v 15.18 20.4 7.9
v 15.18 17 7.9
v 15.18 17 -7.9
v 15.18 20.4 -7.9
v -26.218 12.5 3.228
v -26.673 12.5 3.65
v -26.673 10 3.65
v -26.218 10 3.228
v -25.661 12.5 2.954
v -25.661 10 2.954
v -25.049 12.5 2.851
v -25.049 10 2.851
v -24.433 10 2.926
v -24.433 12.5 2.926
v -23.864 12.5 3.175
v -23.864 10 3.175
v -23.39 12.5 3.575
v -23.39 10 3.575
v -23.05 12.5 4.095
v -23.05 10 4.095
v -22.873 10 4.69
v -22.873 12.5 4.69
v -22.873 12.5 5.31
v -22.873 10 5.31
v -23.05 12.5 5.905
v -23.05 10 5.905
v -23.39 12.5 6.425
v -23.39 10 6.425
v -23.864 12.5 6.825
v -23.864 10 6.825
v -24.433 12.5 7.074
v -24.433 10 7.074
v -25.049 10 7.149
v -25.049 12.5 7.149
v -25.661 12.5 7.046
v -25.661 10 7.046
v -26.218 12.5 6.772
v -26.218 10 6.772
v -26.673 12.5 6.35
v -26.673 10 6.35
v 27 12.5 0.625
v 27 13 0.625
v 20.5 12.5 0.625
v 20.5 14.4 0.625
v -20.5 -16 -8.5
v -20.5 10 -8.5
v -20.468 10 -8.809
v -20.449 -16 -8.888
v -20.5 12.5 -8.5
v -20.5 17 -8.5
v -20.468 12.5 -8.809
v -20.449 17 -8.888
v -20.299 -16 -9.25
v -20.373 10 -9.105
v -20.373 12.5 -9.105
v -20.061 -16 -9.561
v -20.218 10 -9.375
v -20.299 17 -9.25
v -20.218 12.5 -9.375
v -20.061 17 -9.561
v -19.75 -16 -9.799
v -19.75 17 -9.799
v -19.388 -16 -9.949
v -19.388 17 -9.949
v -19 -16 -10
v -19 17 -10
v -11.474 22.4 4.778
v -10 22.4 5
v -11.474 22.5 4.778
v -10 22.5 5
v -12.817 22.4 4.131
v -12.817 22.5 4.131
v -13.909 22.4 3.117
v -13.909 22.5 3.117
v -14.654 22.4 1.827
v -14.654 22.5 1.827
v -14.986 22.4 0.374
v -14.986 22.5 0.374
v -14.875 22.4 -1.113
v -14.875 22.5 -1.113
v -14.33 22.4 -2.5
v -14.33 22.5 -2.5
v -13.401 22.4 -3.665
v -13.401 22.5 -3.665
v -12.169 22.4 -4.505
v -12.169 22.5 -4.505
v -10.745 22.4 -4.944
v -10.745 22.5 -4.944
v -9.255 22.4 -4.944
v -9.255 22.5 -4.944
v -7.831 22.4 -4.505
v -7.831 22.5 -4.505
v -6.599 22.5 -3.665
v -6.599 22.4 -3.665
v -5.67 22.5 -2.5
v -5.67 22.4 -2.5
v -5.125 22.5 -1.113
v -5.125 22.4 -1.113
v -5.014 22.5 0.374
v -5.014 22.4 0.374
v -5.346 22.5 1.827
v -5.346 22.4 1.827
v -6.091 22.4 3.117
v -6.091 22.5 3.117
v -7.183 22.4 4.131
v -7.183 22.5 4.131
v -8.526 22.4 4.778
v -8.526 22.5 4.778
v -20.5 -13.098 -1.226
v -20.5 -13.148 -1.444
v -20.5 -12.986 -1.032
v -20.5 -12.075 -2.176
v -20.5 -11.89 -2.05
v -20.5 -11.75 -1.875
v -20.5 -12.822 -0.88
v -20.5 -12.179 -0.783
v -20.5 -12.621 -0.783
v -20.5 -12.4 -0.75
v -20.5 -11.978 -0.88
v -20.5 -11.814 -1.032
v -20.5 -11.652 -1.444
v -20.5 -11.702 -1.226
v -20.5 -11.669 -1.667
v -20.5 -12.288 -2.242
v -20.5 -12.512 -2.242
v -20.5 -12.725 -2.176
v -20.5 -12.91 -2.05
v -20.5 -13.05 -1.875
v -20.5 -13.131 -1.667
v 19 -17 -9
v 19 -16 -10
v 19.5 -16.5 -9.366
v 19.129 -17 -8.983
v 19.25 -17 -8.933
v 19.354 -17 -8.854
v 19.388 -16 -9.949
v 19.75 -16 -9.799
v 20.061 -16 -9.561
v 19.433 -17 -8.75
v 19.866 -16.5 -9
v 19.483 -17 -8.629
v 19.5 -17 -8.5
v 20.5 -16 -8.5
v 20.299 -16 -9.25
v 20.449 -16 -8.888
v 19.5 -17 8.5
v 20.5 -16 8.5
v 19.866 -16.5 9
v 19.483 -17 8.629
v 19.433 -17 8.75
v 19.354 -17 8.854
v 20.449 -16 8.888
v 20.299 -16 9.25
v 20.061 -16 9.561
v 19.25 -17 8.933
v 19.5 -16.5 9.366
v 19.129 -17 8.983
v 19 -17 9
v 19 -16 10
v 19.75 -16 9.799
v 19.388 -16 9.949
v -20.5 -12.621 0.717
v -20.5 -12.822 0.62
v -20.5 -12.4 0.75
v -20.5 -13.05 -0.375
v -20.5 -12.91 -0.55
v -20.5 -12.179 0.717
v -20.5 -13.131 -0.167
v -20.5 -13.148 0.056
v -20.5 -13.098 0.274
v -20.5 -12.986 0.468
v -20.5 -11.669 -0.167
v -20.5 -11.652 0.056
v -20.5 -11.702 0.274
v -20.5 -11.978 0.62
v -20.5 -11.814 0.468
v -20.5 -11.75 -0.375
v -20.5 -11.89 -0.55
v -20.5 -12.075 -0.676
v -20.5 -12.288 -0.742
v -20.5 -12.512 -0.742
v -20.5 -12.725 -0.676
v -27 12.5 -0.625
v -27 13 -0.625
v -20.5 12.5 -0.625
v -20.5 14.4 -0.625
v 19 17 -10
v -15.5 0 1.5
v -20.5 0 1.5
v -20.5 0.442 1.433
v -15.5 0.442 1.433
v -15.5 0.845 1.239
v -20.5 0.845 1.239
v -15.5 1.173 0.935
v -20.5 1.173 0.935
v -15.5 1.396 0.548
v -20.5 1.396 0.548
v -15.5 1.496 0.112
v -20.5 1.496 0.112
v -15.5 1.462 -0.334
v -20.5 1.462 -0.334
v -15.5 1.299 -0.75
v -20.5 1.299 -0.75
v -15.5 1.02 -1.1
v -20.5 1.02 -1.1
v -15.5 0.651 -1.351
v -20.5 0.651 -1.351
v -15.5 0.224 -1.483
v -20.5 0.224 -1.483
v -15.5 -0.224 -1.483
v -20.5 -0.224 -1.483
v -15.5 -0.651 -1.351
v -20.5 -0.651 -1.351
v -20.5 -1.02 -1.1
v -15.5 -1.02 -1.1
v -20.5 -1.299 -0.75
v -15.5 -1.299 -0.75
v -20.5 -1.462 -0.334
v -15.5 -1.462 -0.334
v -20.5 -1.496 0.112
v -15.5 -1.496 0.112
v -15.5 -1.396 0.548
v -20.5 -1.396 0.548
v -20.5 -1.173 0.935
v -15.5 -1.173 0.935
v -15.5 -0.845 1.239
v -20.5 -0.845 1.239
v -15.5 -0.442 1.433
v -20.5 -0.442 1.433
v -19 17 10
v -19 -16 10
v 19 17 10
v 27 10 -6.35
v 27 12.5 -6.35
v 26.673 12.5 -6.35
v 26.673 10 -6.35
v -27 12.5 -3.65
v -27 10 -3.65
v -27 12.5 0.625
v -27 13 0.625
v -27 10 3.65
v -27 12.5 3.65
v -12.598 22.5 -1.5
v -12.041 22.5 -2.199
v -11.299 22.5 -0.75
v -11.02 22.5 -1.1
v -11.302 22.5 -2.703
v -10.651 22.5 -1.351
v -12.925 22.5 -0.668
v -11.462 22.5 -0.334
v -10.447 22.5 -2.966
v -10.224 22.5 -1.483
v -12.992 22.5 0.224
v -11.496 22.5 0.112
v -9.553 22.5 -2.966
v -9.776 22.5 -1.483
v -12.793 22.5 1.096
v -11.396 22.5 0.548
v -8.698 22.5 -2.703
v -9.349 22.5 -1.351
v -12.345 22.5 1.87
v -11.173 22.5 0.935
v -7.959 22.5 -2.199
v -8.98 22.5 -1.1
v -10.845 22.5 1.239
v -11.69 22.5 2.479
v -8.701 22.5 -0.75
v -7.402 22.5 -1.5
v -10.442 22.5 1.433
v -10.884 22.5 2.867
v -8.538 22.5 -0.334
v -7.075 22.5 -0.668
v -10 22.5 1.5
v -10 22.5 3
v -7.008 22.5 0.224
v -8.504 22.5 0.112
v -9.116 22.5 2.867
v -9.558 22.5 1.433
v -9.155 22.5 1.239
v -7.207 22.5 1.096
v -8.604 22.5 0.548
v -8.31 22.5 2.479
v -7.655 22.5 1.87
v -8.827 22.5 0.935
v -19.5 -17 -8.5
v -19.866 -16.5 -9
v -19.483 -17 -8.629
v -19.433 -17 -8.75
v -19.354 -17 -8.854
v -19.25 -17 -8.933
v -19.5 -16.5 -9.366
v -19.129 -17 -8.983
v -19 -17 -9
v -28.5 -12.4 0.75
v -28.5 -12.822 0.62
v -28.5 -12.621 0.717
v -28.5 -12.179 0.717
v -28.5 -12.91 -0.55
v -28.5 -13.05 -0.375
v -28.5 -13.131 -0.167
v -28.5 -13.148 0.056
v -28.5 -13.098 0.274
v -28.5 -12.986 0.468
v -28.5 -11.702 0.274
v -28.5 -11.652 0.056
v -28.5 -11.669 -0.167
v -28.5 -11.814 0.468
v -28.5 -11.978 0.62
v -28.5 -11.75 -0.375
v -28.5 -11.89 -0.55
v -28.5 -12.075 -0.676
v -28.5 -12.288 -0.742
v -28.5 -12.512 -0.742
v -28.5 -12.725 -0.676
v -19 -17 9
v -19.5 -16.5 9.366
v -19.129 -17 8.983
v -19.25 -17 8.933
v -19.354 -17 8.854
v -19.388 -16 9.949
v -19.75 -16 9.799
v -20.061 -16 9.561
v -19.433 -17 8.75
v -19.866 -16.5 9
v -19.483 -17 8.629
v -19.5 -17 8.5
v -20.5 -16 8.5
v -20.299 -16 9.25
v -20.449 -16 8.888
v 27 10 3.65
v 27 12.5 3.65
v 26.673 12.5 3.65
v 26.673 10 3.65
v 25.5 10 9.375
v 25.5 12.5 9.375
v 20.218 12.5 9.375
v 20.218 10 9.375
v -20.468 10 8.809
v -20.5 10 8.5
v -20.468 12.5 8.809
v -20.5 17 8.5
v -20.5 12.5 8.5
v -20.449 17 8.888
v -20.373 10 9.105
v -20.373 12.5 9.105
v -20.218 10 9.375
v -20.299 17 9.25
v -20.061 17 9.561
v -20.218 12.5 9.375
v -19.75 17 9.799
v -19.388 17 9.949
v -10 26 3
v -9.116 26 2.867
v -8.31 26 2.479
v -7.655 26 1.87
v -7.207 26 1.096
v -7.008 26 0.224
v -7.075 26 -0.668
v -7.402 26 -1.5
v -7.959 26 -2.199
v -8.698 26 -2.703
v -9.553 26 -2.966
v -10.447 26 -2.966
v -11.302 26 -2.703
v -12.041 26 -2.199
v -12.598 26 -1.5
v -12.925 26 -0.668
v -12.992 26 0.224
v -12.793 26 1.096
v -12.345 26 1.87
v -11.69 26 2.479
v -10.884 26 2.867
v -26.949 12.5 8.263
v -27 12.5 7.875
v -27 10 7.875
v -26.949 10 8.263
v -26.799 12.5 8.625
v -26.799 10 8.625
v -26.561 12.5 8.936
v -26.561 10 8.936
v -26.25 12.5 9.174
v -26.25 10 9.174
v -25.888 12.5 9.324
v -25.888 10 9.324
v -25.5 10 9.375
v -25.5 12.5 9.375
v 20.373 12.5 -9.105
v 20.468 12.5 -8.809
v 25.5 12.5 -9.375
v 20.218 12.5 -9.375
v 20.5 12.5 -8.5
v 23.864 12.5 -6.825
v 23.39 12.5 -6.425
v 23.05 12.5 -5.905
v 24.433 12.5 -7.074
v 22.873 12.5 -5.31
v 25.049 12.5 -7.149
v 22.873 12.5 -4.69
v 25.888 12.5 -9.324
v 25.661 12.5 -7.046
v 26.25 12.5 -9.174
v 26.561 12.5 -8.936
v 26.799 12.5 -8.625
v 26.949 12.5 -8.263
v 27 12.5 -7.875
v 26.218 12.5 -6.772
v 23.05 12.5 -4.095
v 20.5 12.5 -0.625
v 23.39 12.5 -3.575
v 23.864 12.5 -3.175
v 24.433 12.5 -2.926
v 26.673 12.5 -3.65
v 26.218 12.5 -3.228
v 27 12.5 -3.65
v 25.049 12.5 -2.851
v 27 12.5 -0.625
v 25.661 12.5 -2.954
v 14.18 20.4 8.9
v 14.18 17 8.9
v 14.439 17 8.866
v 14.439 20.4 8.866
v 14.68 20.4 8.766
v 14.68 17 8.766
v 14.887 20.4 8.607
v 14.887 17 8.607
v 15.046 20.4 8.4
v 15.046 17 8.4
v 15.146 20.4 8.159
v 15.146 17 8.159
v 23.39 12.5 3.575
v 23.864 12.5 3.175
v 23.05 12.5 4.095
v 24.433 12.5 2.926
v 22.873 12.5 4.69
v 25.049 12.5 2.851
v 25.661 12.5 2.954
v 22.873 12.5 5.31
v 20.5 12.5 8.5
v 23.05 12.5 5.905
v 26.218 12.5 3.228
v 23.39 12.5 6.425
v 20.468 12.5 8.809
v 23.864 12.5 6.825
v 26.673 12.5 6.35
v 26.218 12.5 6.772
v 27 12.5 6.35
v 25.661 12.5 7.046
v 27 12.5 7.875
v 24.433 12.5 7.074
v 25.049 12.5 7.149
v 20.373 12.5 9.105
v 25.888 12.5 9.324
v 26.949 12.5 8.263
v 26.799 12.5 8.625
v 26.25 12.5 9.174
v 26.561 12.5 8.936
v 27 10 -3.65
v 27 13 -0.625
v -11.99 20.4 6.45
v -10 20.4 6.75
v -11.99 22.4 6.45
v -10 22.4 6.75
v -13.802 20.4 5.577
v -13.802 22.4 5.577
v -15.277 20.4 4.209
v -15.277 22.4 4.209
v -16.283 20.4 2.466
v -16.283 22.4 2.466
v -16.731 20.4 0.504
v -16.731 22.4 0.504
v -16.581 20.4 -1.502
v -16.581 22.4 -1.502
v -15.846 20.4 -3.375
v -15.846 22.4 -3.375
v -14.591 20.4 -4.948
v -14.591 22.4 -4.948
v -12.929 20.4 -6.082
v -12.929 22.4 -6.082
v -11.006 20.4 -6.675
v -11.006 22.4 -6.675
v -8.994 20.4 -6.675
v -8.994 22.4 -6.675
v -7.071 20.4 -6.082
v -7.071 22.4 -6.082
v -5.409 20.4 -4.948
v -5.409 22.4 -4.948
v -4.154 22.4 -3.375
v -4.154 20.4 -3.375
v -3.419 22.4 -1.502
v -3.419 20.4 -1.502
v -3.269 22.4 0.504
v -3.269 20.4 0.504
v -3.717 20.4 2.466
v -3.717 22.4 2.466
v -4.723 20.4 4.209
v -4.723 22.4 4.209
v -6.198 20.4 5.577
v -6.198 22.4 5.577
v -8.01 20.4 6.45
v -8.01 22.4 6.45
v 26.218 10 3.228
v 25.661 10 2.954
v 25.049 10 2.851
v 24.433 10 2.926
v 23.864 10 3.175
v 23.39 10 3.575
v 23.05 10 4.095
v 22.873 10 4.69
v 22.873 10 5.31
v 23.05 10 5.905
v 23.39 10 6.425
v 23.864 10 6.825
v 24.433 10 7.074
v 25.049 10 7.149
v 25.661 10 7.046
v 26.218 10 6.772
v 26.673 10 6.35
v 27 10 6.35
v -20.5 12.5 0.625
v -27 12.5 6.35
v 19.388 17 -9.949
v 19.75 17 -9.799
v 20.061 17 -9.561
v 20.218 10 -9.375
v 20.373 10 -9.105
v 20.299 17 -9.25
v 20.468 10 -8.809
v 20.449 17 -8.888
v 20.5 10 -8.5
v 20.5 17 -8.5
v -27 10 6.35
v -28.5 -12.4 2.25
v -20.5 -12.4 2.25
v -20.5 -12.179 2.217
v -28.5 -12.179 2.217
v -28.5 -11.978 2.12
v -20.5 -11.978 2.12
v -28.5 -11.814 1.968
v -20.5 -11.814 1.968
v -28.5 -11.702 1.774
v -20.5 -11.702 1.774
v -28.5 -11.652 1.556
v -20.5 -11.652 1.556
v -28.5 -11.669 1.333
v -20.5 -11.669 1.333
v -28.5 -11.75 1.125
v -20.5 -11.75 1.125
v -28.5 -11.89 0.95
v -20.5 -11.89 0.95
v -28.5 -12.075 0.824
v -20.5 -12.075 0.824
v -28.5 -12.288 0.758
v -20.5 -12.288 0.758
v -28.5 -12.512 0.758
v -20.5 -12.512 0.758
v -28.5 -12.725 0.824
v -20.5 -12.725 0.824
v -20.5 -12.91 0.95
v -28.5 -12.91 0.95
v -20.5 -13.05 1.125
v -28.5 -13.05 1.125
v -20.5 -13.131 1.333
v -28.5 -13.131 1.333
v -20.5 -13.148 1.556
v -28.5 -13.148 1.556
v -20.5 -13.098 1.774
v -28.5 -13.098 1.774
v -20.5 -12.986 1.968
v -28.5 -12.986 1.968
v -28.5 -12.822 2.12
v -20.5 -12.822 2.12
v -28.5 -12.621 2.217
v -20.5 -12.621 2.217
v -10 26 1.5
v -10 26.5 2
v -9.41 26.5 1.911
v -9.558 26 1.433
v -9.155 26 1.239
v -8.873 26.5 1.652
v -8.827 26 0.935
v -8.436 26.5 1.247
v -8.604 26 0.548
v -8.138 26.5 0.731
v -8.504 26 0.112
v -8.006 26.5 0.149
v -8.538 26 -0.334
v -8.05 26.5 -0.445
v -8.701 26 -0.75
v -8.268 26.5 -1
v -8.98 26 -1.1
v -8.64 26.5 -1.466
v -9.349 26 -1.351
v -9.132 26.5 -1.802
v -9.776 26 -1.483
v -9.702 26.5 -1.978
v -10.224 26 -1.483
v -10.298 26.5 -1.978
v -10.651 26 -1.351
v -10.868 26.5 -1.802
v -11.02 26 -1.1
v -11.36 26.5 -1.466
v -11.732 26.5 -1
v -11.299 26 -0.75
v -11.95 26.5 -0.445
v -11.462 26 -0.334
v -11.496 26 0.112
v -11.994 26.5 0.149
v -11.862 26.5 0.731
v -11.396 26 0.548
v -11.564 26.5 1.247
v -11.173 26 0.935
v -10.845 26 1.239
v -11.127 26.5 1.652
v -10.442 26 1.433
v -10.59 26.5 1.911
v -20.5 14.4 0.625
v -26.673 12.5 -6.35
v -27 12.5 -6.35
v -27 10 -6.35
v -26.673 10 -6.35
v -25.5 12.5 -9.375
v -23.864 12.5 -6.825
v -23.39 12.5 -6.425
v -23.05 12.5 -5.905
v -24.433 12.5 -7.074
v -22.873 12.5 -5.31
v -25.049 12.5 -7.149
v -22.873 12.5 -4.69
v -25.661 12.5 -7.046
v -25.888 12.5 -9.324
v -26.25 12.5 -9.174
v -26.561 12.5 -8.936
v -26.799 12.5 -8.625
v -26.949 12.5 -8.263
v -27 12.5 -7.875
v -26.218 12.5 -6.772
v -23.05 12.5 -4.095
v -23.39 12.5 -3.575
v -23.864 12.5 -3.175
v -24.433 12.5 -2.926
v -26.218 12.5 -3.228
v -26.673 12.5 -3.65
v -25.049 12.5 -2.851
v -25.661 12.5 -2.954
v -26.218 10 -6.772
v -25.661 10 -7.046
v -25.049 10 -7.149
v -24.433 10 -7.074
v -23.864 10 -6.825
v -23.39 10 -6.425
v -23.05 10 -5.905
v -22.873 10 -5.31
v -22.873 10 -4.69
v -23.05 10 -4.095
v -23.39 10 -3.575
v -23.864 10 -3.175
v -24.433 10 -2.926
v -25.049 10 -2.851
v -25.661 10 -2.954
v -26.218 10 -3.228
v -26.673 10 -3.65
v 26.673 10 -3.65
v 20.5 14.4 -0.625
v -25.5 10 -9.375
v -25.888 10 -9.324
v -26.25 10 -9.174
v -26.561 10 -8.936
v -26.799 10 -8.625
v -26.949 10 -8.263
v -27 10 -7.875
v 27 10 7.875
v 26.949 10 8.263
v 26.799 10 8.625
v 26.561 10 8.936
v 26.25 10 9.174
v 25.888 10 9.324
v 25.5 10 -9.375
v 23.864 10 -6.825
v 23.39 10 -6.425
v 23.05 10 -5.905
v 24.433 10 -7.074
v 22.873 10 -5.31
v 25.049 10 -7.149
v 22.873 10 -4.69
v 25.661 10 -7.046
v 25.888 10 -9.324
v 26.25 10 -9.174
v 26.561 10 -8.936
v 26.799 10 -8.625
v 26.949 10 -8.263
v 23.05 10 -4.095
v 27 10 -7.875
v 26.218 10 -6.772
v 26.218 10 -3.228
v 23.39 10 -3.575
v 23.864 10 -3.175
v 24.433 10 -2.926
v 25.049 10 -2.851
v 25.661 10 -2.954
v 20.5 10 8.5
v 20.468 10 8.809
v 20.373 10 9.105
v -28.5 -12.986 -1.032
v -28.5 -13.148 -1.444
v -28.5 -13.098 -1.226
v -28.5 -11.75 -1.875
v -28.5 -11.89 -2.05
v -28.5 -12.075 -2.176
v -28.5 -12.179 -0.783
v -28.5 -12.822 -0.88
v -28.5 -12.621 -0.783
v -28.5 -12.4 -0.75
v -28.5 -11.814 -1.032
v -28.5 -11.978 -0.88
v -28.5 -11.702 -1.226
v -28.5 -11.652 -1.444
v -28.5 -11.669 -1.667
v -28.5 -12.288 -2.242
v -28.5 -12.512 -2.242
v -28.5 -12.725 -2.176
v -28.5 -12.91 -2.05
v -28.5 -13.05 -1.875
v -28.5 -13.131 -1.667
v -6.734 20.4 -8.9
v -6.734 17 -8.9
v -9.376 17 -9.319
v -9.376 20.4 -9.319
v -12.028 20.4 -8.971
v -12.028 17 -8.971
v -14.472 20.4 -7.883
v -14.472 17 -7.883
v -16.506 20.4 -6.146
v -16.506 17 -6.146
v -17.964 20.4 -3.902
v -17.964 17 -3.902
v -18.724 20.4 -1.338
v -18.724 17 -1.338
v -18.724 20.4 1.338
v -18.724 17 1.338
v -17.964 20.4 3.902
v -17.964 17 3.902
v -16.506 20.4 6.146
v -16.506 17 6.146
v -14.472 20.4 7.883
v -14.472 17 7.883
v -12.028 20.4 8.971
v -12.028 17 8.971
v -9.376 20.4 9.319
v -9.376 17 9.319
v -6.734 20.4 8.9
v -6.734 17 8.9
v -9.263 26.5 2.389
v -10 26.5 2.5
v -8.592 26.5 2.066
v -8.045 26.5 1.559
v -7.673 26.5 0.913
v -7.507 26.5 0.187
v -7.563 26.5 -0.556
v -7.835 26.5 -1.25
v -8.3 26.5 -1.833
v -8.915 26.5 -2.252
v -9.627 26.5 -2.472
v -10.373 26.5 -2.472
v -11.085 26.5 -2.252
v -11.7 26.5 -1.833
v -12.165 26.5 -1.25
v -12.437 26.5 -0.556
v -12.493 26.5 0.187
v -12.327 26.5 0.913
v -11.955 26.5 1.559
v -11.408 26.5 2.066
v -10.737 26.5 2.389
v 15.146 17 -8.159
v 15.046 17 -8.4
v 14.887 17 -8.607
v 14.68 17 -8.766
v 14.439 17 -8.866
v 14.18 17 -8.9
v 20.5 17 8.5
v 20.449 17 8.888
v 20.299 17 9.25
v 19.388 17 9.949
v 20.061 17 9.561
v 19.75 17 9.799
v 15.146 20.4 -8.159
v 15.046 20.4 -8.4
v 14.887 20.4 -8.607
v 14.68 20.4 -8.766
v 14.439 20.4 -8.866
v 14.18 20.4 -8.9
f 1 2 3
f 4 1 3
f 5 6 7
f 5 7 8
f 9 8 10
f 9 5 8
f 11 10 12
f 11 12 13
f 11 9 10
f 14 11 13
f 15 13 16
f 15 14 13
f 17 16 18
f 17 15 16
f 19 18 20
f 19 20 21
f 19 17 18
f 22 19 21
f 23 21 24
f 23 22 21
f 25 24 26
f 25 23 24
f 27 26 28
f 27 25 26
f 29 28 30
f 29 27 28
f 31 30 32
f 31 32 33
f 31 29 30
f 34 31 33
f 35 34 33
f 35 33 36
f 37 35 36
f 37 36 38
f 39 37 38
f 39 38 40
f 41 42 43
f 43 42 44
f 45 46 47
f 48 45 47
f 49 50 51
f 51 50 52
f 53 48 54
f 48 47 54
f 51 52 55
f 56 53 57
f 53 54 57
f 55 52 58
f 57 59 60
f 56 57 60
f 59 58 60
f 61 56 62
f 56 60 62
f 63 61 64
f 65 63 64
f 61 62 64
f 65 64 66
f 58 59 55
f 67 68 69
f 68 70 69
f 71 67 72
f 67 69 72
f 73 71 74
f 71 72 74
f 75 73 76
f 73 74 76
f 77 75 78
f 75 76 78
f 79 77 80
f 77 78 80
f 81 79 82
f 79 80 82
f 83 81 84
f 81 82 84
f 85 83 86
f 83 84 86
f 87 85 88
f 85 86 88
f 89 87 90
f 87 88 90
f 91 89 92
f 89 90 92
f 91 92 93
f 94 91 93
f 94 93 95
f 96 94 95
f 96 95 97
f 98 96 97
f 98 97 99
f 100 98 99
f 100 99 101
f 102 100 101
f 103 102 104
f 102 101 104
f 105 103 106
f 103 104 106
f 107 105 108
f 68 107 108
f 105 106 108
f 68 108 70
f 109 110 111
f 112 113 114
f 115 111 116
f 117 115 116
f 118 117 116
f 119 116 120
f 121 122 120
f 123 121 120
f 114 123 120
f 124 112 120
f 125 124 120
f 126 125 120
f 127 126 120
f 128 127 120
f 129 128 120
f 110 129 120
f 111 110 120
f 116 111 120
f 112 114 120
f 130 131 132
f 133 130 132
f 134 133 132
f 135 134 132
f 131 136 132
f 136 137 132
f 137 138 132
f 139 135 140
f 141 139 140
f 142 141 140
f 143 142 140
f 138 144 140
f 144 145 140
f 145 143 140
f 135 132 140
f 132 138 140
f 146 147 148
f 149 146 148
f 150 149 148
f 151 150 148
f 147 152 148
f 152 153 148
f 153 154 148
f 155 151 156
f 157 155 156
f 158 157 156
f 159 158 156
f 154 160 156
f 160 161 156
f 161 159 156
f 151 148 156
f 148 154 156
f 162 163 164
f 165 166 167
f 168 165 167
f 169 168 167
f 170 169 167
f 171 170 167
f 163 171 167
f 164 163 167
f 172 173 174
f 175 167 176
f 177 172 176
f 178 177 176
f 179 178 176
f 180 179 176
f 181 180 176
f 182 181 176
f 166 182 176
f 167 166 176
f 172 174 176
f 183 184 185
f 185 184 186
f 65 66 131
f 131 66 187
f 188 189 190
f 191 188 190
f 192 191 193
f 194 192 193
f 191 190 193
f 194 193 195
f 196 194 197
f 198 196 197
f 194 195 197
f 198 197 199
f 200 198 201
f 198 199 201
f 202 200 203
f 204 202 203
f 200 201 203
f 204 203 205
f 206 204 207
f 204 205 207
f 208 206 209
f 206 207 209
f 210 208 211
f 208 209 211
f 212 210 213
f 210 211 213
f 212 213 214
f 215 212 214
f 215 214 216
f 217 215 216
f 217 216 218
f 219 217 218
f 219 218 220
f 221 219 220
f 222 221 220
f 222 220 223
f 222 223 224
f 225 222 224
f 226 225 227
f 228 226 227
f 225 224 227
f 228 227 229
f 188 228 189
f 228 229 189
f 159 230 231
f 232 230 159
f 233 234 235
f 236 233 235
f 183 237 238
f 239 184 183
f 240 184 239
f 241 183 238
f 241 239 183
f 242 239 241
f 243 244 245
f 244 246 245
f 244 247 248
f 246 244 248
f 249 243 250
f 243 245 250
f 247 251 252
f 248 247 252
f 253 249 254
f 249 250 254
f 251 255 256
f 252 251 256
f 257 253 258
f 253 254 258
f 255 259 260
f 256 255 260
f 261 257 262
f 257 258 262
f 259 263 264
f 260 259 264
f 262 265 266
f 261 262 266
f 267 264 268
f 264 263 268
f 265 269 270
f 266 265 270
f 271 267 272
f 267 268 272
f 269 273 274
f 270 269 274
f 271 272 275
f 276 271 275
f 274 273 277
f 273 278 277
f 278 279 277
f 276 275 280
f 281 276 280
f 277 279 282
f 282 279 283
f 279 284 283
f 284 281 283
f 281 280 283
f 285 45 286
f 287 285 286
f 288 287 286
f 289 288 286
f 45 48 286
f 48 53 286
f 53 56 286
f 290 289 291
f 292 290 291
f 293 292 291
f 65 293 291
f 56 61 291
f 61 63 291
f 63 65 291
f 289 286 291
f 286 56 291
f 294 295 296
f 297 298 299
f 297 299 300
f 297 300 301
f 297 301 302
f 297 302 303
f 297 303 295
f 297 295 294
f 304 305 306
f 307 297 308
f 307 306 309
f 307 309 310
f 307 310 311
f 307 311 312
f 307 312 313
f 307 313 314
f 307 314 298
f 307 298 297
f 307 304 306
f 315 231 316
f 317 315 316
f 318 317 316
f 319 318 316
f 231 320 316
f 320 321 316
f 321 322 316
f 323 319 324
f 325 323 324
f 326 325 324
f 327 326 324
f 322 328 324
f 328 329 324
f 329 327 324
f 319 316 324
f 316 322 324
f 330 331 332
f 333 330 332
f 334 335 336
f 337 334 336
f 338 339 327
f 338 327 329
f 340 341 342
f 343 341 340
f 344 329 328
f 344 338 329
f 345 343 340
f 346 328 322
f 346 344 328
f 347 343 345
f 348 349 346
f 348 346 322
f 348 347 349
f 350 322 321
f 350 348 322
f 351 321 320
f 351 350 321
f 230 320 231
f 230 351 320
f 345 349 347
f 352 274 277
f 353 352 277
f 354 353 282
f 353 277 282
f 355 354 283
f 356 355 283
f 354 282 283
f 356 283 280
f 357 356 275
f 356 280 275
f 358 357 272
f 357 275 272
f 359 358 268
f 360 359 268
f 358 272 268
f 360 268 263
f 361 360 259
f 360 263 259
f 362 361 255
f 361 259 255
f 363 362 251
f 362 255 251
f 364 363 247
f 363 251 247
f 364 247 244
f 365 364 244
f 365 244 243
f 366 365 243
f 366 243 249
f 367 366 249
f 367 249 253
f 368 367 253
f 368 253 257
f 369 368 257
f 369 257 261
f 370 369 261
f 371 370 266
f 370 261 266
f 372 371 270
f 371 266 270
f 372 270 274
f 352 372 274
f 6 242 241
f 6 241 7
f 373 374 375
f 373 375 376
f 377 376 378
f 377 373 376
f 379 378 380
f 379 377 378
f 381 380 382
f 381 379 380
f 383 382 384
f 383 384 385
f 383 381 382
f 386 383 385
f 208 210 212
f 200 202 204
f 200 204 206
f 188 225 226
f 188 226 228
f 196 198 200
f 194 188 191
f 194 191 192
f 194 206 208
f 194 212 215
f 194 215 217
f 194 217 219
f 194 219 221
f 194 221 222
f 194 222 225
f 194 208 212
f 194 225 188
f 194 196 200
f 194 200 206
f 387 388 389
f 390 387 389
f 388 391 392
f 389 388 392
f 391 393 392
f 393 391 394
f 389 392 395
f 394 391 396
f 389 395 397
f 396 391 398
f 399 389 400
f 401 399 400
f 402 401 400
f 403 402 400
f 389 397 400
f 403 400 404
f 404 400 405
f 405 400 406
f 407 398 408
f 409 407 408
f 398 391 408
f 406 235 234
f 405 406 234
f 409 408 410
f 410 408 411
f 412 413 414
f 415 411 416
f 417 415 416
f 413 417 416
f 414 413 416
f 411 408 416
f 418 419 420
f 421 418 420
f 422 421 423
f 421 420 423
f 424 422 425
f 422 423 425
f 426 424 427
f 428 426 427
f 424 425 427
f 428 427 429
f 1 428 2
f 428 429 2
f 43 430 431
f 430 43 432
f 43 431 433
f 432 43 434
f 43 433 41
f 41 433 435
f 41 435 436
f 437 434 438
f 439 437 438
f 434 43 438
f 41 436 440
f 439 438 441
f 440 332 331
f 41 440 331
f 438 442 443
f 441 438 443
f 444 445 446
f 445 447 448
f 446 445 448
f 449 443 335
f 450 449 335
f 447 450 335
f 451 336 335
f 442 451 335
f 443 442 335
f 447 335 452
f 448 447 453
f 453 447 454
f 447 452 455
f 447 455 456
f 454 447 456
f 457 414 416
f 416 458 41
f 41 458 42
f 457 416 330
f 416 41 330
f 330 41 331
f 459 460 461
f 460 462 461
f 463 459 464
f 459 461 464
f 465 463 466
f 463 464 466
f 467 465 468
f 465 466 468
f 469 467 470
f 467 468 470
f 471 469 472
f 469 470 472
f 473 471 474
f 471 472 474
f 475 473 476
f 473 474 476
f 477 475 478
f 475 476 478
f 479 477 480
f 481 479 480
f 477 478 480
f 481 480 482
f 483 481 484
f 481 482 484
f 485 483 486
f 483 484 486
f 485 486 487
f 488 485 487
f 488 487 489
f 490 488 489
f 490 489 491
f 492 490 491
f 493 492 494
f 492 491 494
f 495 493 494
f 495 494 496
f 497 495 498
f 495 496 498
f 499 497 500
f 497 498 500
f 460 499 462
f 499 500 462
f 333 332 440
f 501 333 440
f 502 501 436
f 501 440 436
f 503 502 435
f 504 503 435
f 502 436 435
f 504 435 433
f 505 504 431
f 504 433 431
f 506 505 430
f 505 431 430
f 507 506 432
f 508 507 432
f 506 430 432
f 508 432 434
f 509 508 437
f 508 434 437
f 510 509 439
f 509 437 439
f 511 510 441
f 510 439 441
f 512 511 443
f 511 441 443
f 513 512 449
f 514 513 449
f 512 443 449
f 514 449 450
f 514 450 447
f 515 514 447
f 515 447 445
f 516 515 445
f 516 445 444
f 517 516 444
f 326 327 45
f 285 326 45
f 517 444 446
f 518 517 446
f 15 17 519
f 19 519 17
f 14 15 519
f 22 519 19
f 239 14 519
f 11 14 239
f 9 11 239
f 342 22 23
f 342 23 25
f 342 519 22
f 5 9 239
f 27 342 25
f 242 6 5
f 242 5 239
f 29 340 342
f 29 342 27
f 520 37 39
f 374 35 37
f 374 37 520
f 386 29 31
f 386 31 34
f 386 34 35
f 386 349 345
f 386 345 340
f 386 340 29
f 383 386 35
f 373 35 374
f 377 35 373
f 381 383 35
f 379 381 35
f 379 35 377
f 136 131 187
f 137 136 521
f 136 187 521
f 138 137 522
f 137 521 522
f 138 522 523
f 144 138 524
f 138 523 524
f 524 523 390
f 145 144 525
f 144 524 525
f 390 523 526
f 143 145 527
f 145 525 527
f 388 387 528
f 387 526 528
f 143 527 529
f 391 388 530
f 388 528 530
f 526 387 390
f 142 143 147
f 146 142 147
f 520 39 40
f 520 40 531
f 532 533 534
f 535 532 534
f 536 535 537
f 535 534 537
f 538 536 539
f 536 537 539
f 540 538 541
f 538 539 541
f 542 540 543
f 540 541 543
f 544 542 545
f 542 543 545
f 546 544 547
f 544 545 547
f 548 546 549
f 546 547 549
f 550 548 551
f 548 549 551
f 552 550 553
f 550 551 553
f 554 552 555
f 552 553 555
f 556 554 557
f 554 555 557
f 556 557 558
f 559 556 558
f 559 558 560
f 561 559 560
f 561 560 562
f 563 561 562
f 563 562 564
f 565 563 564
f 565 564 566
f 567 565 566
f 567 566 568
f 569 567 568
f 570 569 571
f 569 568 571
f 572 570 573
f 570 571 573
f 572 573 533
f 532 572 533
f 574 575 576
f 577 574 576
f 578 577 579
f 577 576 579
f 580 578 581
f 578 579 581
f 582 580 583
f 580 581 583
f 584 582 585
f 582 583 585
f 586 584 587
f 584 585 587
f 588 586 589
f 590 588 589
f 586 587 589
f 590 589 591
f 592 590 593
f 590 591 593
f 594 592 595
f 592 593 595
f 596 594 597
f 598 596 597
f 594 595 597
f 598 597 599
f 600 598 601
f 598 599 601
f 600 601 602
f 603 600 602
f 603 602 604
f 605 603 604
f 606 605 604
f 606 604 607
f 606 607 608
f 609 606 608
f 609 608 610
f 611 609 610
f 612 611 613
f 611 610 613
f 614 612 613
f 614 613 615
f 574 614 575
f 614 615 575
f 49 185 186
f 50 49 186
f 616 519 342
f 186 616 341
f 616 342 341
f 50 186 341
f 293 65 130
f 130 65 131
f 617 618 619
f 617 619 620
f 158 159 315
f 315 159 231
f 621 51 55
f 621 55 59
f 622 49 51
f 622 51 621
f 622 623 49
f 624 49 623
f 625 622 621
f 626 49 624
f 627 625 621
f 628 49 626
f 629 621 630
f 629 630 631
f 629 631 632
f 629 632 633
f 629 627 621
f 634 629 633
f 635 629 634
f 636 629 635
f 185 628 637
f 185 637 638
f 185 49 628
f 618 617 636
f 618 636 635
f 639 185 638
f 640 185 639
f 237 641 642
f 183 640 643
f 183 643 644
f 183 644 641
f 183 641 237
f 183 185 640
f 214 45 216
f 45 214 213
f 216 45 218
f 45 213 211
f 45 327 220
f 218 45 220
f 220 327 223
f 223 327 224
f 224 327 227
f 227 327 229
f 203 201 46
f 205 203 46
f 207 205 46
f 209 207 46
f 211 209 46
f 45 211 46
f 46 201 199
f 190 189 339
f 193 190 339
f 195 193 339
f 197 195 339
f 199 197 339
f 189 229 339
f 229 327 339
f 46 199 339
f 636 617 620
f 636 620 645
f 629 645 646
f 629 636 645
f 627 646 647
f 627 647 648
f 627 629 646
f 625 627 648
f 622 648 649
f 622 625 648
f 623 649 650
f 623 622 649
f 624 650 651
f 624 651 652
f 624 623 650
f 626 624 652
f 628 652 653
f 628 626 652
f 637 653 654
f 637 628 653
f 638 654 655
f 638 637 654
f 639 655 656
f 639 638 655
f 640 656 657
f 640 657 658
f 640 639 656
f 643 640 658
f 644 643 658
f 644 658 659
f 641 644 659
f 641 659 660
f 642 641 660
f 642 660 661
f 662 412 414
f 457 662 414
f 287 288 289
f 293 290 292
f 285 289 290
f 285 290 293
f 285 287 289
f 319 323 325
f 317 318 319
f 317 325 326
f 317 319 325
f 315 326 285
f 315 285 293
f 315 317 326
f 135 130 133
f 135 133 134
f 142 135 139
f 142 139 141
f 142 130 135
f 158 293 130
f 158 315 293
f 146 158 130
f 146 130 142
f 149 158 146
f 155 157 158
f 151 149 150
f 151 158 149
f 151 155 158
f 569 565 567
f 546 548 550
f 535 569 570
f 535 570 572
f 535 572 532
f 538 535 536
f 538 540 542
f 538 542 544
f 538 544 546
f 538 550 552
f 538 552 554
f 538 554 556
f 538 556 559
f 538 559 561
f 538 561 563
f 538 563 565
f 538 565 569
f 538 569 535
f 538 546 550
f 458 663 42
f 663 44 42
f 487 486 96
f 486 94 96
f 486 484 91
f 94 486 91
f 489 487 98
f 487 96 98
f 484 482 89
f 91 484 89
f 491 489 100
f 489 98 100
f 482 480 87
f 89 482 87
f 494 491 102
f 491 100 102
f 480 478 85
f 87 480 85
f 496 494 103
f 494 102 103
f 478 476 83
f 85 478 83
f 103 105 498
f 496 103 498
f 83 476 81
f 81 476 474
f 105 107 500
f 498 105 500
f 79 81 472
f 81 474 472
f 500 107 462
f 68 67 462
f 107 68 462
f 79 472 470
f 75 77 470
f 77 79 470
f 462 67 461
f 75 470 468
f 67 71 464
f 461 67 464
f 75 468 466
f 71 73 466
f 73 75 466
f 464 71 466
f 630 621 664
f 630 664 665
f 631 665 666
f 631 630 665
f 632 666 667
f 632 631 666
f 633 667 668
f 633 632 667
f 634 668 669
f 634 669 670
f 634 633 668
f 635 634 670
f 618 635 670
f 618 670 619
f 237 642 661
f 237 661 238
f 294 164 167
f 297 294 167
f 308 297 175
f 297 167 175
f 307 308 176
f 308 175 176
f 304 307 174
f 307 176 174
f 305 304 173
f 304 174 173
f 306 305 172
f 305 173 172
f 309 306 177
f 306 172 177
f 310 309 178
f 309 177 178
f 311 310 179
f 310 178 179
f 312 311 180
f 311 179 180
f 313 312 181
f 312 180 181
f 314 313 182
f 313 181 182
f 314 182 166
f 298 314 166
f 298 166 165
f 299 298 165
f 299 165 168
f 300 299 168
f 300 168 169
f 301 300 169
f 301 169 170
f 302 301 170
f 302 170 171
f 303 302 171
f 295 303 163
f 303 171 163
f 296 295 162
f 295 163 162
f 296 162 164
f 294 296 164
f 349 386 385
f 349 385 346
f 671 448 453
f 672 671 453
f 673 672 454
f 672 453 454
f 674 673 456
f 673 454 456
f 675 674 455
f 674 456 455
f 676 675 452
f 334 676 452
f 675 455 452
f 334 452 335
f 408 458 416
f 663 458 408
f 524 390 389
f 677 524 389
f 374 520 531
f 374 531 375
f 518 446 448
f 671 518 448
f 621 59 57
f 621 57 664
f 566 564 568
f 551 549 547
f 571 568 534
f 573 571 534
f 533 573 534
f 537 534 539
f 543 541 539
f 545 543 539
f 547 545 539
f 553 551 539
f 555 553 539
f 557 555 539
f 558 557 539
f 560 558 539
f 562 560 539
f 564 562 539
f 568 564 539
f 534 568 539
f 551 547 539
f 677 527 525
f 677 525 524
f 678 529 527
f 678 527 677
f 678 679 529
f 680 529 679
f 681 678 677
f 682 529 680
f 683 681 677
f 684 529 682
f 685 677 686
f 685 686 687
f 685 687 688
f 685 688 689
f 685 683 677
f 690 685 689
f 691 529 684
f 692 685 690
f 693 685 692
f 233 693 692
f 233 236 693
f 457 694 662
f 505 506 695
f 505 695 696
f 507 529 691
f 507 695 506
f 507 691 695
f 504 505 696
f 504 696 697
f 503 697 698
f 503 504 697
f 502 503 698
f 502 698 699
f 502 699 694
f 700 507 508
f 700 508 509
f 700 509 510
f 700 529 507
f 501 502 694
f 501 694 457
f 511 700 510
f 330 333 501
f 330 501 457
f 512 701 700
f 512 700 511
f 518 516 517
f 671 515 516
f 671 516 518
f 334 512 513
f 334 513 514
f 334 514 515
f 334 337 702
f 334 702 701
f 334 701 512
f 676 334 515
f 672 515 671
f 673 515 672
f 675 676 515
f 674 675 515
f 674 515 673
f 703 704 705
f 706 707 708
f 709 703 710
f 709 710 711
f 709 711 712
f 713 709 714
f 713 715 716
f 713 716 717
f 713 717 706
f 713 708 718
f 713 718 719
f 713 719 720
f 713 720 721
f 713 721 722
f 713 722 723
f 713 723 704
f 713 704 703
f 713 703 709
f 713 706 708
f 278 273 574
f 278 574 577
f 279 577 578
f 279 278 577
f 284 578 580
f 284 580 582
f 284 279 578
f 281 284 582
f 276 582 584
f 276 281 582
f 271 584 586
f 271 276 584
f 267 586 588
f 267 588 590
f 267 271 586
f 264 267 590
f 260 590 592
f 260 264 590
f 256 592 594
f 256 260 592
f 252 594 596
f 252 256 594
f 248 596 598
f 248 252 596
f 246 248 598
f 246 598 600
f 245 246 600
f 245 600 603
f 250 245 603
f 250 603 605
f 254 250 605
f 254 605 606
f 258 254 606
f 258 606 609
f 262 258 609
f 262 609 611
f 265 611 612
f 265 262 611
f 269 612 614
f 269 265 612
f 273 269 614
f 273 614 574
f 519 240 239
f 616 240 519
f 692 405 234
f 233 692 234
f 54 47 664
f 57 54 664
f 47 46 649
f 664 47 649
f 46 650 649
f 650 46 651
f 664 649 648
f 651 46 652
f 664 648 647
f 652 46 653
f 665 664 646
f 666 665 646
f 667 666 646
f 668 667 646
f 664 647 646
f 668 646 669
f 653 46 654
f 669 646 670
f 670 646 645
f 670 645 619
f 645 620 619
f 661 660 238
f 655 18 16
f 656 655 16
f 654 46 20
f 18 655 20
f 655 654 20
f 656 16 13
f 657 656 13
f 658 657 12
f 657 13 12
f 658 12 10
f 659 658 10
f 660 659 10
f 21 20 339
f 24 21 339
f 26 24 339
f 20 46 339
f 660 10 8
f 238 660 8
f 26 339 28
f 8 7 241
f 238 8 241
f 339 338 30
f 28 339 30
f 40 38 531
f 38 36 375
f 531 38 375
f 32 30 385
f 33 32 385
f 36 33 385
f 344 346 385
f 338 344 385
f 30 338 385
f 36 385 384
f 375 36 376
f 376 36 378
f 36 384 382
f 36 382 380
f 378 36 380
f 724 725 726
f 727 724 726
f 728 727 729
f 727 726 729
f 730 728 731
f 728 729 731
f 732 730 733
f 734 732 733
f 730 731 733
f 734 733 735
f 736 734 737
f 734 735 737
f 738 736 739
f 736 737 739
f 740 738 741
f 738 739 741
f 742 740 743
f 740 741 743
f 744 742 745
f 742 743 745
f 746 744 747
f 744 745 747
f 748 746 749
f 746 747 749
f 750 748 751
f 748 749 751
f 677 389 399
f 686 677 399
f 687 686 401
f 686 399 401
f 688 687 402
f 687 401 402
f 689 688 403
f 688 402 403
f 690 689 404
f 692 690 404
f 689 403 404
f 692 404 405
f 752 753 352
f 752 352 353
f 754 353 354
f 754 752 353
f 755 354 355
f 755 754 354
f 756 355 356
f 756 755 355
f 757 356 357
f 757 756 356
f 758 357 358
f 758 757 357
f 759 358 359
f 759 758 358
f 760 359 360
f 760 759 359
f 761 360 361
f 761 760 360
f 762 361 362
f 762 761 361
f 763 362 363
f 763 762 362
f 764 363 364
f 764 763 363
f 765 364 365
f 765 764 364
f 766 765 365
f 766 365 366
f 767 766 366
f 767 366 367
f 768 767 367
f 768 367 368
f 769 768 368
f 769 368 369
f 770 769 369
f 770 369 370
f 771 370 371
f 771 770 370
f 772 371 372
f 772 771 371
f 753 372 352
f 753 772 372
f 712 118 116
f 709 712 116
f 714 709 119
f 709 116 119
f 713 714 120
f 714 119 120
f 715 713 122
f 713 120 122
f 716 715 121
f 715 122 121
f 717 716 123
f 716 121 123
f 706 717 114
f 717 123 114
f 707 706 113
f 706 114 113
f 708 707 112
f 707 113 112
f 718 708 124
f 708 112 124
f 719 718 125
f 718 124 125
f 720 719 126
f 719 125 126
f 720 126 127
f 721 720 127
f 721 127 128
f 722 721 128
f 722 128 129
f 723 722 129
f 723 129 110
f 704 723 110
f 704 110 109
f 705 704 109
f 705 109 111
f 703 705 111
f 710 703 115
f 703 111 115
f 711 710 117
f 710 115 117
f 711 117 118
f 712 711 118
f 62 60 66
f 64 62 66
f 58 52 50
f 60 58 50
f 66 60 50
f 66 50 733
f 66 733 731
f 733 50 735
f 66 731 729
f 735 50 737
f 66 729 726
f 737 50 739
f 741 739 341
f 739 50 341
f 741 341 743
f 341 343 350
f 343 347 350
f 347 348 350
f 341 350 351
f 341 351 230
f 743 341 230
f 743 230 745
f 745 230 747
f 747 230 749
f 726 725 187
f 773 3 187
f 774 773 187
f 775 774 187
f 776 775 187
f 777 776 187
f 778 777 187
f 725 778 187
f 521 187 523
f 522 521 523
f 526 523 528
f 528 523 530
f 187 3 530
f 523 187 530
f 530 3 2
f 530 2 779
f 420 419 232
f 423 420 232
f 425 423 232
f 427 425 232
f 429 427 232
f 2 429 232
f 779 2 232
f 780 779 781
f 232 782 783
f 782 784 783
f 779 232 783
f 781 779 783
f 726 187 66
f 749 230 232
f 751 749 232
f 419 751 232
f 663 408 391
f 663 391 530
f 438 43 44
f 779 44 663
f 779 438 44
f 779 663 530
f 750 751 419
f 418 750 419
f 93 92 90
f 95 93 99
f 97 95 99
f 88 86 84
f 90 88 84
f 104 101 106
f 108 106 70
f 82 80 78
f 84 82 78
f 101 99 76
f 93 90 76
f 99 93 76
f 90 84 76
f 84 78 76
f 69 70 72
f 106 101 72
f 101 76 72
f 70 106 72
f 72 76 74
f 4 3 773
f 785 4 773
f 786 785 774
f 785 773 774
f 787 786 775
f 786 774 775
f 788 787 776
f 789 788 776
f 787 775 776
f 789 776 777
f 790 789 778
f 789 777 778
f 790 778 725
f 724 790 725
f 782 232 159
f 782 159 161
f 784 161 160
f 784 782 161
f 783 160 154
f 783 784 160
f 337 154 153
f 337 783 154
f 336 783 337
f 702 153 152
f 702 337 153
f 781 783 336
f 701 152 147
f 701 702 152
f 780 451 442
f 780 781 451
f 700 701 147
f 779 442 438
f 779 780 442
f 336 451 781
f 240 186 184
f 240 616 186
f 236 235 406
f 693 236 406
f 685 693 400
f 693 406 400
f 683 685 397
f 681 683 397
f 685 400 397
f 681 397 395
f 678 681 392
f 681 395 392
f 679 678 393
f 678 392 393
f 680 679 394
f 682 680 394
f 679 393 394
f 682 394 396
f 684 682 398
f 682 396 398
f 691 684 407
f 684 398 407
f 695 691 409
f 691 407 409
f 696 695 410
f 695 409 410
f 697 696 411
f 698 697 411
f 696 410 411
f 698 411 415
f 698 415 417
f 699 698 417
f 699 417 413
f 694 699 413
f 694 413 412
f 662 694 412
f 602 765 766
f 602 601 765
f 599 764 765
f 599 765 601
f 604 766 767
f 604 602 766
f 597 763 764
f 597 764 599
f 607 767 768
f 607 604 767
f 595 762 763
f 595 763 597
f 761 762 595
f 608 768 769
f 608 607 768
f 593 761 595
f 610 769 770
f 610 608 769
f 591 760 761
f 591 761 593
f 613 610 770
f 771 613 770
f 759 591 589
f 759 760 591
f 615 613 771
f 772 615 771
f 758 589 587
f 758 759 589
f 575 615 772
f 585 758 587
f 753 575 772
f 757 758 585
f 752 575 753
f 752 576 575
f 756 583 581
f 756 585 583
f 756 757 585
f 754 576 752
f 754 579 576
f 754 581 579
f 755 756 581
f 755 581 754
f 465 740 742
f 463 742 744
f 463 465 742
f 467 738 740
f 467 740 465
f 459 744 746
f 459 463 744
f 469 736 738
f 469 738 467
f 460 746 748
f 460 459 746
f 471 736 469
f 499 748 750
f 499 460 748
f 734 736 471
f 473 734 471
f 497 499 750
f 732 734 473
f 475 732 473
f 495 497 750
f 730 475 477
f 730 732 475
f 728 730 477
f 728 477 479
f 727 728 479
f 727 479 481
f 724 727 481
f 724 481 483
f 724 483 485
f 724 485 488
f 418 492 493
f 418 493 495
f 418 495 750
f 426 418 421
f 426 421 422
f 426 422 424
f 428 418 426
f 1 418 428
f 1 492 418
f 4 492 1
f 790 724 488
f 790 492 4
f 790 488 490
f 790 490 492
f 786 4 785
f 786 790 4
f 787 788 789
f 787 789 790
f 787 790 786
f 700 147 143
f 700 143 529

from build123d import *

# Parameters (mm, degrees)
SKETCH1_W          = 41
SKETCH1_H          = 34
EXTRUDE1_DEPTH     = 10
EXTRUDE2_DEPTH     = 3.4
SKETCH4_R          = 3
SKETCH4_R_2        = 1.5
EXTRUDE3_DEPTH     = 4
FILLET1_R          = 1.5
EXTRUDE4_DEPTH     = 2.5
EXTRUDE5_DEPTH     = 0.625
SKETCH8_R          = 0.75
EXTRUDE6_DEPTH     = 8
SKETCH9_R          = 0.75
EXTRUDE7_DEPTH     = 8
SKETCH10_R         = 0.75
EXTRUDE8_DEPTH     = 8
CHAMFER1_SIZE      = 1
CHAMFER2_SIZE      = 0.5
SKETCH11_R         = 1.5
CUT_EXTRUDE1_DEPTH = 5


with BuildPart() as part:
    # Sketch1 → Extrude1 (new, symmetric)
    with BuildSketch(Plane.XY):
        Rectangle(SKETCH1_W, SKETCH1_H)
    extrude(amount=EXTRUDE1_DEPTH, both=True)

    # Sketch2 → Extrude2 (add)
    with BuildSketch(Plane(origin=(0, 17, 0), x_dir=(1, 0, 0), z_dir=(0, 1, 0))):
        with BuildLine():
            Line((-6.733702836, -8.9), (14.18, -8.9))
            ThreePointArc((14.18, -8.9), (14.887106781, -8.607106781), (15.18, -7.9))
            Line((15.18, -7.9), (15.18, 7.9))
            ThreePointArc((15.18, 7.9), (14.887106781, 8.607106781), (14.18, 8.9))
            Line((14.18, 8.9), (-6.733702836, 8.9))
            ThreePointArc((-6.733702836, 8.9), (-18.82, 0), (-6.733702836, -8.9))
        make_face()
    extrude(amount=EXTRUDE2_DEPTH)

    # Sketch3 → Revolve1 (revolve)
    with BuildSketch(Plane.XY, mode=Mode.PRIVATE) as revolve1_sk:
        Polygon((-10, 20.4), (-16.75, 20.4), (-16.75, 22.4), (-15, 22.4), (-15, 22.5), (-10, 22.5), align=None)
    revolve(revolve1_sk.sketch.rotate(Axis((-10, 22.5, 0), (0, -1, 0)), 270), axis=Axis((-10, 22.5, 0), (0, -1, 0)))

    # Fillet1
    fillet1_edges = [part.edges().sort_by_distance(p)[0] for p in [
        (20.5, 0, 10),
        (-20.5, 0, 10),
        (20.5, 0, -10),
        (-20.5, 0, -10),
    ]]
    fillet(fillet1_edges, radius=FILLET1_R)

    # Sketch6 → Extrude4 (add)
    with BuildSketch(Plane(origin=(0, 12.5, 0), x_dir=(-1, 0, 0), z_dir=(0, 1, 0))):
        with BuildLine():
            Line((27, 0), (27, 3.65))
            Line((27, 3.65), (26.673320053, 3.65))
            ThreePointArc((26.673320053, 3.65), (22.85, 5), (26.673320053, 6.35))
            Line((26.673320053, 6.35), (27, 6.35))
            Line((27, 6.35), (27, 7.875))
            ThreePointArc((27, 7.875), (26.560660172, 8.935660172), (25.5, 9.375))
            Line((25.5, 9.375), (20.218349293, 9.375))
            ThreePointArc((20.218349293, 9.375), (20.427852223, 8.959606386), (20.5, 8.5))
            Line((20.5, 8.5), (20.5, 0))
            Line((20.5, 0), (20.5, -8.5))
            ThreePointArc((20.5, -8.5), (20.427852223, -8.959606386), (20.218349293, -9.375))
            Line((20.218349293, -9.375), (25.5, -9.375))
            ThreePointArc((25.5, -9.375), (26.560660172, -8.935660172), (27, -7.875))
            Line((27, -7.875), (27, -6.35))
            Line((27, -6.35), (26.673320053, -6.35))
            ThreePointArc((26.673320053, -6.35), (22.85, -5), (26.673320053, -3.65))
            Line((26.673320053, -3.65), (27, -3.65))
            Line((27, -3.65), (27, 0))
        make_face()
    extrude4 = extrude(amount=-EXTRUDE4_DEPTH)

    # Sketch7 → Extrude5 (add, symmetric)
    with BuildSketch(Plane.XY):
        Polygon((-20.5, 14.4), (-27, 13), (-27, 12.5), (-20.5, 12.5), align=None)
    extrude5 = extrude(amount=EXTRUDE5_DEPTH, both=True)

    # Mirror1: Extrude4, Extrude5 across plane
    add(extrude4.mirror(Plane(origin=(0, 0, 0), x_dir=(0, 0, 1), z_dir=(1, 0, 0))))
    add(extrude5.mirror(Plane(origin=(0, 0, 0), x_dir=(0, 0, 1), z_dir=(1, 0, 0))))

    # Chamfer1
    chamfer1_edges = [part.edges().sort_by_distance(p)[0] for p in [
        (20.5, -17, 0),
        (0, -17, -10),
        (0, -17, 10),
        (-20.5, -17, 0),
        (-20.060660172, -17, 9.560660172),
        (-20.060660172, -17, -9.560660172),
        (20.060660172, -17, 9.560660172),
        (20.060660172, -17, -9.560660172),
    ]]
    chamfer(chamfer1_edges, length=CHAMFER1_SIZE)

    # Sketch11 → Cut-Extrude1 (cut)
    with BuildSketch(Plane.ZY.offset(20.5)):
        Circle(SKETCH11_R)
    extrude(amount=-CUT_EXTRUDE1_DEPTH, mode=Mode.SUBTRACT)


with BuildPart() as body_2:
    # Sketch4 → Extrude3 (new body)
    with BuildSketch(Plane(origin=(0, 22.5, 0), x_dir=(1, 0, 0), z_dir=(0, 1, 0))):
        with Locations(Location((-10, 0, 0), (0, 0, 270))):
            Circle(SKETCH4_R)
        with Locations(Location((-10, 0, 0), (0, 0, 270))):
            Circle(SKETCH4_R_2, mode=Mode.SUBTRACT)
    extrude(amount=EXTRUDE3_DEPTH)

    # Chamfer2
    chamfer2_edges = [body_2.edges().sort_by_distance(p)[0] for p in [
        (-10, 26.5, -3),
        (-10, 26.5, -1.5),
    ]]
    chamfer(chamfer2_edges, length=CHAMFER2_SIZE)


with BuildPart() as body_3:
    # Sketch8 → Extrude6 (new body)
    with BuildSketch(Plane.ZY.offset(20.5)):
        with Locations((0, -12.4)):
            Circle(SKETCH8_R)
    extrude(amount=EXTRUDE6_DEPTH)


with BuildPart() as body_4:
    # Sketch9 → Extrude7 (new body)
    with BuildSketch(Plane.ZY.offset(20.5)):
        with Locations((1.5, -12.4)):
            Circle(SKETCH9_R)
    extrude(amount=EXTRUDE7_DEPTH)


with BuildPart() as body_5:
    # Sketch10 → Extrude8 (new body)
    with BuildSketch(Plane.ZY.offset(20.5)):
        with Locations((-1.5, -12.4)):
            Circle(SKETCH10_R)
    extrude(amount=EXTRUDE8_DEPTH)


solid = Compound([part.part, body_2.part, body_3.part, body_4.part, body_5.part])
